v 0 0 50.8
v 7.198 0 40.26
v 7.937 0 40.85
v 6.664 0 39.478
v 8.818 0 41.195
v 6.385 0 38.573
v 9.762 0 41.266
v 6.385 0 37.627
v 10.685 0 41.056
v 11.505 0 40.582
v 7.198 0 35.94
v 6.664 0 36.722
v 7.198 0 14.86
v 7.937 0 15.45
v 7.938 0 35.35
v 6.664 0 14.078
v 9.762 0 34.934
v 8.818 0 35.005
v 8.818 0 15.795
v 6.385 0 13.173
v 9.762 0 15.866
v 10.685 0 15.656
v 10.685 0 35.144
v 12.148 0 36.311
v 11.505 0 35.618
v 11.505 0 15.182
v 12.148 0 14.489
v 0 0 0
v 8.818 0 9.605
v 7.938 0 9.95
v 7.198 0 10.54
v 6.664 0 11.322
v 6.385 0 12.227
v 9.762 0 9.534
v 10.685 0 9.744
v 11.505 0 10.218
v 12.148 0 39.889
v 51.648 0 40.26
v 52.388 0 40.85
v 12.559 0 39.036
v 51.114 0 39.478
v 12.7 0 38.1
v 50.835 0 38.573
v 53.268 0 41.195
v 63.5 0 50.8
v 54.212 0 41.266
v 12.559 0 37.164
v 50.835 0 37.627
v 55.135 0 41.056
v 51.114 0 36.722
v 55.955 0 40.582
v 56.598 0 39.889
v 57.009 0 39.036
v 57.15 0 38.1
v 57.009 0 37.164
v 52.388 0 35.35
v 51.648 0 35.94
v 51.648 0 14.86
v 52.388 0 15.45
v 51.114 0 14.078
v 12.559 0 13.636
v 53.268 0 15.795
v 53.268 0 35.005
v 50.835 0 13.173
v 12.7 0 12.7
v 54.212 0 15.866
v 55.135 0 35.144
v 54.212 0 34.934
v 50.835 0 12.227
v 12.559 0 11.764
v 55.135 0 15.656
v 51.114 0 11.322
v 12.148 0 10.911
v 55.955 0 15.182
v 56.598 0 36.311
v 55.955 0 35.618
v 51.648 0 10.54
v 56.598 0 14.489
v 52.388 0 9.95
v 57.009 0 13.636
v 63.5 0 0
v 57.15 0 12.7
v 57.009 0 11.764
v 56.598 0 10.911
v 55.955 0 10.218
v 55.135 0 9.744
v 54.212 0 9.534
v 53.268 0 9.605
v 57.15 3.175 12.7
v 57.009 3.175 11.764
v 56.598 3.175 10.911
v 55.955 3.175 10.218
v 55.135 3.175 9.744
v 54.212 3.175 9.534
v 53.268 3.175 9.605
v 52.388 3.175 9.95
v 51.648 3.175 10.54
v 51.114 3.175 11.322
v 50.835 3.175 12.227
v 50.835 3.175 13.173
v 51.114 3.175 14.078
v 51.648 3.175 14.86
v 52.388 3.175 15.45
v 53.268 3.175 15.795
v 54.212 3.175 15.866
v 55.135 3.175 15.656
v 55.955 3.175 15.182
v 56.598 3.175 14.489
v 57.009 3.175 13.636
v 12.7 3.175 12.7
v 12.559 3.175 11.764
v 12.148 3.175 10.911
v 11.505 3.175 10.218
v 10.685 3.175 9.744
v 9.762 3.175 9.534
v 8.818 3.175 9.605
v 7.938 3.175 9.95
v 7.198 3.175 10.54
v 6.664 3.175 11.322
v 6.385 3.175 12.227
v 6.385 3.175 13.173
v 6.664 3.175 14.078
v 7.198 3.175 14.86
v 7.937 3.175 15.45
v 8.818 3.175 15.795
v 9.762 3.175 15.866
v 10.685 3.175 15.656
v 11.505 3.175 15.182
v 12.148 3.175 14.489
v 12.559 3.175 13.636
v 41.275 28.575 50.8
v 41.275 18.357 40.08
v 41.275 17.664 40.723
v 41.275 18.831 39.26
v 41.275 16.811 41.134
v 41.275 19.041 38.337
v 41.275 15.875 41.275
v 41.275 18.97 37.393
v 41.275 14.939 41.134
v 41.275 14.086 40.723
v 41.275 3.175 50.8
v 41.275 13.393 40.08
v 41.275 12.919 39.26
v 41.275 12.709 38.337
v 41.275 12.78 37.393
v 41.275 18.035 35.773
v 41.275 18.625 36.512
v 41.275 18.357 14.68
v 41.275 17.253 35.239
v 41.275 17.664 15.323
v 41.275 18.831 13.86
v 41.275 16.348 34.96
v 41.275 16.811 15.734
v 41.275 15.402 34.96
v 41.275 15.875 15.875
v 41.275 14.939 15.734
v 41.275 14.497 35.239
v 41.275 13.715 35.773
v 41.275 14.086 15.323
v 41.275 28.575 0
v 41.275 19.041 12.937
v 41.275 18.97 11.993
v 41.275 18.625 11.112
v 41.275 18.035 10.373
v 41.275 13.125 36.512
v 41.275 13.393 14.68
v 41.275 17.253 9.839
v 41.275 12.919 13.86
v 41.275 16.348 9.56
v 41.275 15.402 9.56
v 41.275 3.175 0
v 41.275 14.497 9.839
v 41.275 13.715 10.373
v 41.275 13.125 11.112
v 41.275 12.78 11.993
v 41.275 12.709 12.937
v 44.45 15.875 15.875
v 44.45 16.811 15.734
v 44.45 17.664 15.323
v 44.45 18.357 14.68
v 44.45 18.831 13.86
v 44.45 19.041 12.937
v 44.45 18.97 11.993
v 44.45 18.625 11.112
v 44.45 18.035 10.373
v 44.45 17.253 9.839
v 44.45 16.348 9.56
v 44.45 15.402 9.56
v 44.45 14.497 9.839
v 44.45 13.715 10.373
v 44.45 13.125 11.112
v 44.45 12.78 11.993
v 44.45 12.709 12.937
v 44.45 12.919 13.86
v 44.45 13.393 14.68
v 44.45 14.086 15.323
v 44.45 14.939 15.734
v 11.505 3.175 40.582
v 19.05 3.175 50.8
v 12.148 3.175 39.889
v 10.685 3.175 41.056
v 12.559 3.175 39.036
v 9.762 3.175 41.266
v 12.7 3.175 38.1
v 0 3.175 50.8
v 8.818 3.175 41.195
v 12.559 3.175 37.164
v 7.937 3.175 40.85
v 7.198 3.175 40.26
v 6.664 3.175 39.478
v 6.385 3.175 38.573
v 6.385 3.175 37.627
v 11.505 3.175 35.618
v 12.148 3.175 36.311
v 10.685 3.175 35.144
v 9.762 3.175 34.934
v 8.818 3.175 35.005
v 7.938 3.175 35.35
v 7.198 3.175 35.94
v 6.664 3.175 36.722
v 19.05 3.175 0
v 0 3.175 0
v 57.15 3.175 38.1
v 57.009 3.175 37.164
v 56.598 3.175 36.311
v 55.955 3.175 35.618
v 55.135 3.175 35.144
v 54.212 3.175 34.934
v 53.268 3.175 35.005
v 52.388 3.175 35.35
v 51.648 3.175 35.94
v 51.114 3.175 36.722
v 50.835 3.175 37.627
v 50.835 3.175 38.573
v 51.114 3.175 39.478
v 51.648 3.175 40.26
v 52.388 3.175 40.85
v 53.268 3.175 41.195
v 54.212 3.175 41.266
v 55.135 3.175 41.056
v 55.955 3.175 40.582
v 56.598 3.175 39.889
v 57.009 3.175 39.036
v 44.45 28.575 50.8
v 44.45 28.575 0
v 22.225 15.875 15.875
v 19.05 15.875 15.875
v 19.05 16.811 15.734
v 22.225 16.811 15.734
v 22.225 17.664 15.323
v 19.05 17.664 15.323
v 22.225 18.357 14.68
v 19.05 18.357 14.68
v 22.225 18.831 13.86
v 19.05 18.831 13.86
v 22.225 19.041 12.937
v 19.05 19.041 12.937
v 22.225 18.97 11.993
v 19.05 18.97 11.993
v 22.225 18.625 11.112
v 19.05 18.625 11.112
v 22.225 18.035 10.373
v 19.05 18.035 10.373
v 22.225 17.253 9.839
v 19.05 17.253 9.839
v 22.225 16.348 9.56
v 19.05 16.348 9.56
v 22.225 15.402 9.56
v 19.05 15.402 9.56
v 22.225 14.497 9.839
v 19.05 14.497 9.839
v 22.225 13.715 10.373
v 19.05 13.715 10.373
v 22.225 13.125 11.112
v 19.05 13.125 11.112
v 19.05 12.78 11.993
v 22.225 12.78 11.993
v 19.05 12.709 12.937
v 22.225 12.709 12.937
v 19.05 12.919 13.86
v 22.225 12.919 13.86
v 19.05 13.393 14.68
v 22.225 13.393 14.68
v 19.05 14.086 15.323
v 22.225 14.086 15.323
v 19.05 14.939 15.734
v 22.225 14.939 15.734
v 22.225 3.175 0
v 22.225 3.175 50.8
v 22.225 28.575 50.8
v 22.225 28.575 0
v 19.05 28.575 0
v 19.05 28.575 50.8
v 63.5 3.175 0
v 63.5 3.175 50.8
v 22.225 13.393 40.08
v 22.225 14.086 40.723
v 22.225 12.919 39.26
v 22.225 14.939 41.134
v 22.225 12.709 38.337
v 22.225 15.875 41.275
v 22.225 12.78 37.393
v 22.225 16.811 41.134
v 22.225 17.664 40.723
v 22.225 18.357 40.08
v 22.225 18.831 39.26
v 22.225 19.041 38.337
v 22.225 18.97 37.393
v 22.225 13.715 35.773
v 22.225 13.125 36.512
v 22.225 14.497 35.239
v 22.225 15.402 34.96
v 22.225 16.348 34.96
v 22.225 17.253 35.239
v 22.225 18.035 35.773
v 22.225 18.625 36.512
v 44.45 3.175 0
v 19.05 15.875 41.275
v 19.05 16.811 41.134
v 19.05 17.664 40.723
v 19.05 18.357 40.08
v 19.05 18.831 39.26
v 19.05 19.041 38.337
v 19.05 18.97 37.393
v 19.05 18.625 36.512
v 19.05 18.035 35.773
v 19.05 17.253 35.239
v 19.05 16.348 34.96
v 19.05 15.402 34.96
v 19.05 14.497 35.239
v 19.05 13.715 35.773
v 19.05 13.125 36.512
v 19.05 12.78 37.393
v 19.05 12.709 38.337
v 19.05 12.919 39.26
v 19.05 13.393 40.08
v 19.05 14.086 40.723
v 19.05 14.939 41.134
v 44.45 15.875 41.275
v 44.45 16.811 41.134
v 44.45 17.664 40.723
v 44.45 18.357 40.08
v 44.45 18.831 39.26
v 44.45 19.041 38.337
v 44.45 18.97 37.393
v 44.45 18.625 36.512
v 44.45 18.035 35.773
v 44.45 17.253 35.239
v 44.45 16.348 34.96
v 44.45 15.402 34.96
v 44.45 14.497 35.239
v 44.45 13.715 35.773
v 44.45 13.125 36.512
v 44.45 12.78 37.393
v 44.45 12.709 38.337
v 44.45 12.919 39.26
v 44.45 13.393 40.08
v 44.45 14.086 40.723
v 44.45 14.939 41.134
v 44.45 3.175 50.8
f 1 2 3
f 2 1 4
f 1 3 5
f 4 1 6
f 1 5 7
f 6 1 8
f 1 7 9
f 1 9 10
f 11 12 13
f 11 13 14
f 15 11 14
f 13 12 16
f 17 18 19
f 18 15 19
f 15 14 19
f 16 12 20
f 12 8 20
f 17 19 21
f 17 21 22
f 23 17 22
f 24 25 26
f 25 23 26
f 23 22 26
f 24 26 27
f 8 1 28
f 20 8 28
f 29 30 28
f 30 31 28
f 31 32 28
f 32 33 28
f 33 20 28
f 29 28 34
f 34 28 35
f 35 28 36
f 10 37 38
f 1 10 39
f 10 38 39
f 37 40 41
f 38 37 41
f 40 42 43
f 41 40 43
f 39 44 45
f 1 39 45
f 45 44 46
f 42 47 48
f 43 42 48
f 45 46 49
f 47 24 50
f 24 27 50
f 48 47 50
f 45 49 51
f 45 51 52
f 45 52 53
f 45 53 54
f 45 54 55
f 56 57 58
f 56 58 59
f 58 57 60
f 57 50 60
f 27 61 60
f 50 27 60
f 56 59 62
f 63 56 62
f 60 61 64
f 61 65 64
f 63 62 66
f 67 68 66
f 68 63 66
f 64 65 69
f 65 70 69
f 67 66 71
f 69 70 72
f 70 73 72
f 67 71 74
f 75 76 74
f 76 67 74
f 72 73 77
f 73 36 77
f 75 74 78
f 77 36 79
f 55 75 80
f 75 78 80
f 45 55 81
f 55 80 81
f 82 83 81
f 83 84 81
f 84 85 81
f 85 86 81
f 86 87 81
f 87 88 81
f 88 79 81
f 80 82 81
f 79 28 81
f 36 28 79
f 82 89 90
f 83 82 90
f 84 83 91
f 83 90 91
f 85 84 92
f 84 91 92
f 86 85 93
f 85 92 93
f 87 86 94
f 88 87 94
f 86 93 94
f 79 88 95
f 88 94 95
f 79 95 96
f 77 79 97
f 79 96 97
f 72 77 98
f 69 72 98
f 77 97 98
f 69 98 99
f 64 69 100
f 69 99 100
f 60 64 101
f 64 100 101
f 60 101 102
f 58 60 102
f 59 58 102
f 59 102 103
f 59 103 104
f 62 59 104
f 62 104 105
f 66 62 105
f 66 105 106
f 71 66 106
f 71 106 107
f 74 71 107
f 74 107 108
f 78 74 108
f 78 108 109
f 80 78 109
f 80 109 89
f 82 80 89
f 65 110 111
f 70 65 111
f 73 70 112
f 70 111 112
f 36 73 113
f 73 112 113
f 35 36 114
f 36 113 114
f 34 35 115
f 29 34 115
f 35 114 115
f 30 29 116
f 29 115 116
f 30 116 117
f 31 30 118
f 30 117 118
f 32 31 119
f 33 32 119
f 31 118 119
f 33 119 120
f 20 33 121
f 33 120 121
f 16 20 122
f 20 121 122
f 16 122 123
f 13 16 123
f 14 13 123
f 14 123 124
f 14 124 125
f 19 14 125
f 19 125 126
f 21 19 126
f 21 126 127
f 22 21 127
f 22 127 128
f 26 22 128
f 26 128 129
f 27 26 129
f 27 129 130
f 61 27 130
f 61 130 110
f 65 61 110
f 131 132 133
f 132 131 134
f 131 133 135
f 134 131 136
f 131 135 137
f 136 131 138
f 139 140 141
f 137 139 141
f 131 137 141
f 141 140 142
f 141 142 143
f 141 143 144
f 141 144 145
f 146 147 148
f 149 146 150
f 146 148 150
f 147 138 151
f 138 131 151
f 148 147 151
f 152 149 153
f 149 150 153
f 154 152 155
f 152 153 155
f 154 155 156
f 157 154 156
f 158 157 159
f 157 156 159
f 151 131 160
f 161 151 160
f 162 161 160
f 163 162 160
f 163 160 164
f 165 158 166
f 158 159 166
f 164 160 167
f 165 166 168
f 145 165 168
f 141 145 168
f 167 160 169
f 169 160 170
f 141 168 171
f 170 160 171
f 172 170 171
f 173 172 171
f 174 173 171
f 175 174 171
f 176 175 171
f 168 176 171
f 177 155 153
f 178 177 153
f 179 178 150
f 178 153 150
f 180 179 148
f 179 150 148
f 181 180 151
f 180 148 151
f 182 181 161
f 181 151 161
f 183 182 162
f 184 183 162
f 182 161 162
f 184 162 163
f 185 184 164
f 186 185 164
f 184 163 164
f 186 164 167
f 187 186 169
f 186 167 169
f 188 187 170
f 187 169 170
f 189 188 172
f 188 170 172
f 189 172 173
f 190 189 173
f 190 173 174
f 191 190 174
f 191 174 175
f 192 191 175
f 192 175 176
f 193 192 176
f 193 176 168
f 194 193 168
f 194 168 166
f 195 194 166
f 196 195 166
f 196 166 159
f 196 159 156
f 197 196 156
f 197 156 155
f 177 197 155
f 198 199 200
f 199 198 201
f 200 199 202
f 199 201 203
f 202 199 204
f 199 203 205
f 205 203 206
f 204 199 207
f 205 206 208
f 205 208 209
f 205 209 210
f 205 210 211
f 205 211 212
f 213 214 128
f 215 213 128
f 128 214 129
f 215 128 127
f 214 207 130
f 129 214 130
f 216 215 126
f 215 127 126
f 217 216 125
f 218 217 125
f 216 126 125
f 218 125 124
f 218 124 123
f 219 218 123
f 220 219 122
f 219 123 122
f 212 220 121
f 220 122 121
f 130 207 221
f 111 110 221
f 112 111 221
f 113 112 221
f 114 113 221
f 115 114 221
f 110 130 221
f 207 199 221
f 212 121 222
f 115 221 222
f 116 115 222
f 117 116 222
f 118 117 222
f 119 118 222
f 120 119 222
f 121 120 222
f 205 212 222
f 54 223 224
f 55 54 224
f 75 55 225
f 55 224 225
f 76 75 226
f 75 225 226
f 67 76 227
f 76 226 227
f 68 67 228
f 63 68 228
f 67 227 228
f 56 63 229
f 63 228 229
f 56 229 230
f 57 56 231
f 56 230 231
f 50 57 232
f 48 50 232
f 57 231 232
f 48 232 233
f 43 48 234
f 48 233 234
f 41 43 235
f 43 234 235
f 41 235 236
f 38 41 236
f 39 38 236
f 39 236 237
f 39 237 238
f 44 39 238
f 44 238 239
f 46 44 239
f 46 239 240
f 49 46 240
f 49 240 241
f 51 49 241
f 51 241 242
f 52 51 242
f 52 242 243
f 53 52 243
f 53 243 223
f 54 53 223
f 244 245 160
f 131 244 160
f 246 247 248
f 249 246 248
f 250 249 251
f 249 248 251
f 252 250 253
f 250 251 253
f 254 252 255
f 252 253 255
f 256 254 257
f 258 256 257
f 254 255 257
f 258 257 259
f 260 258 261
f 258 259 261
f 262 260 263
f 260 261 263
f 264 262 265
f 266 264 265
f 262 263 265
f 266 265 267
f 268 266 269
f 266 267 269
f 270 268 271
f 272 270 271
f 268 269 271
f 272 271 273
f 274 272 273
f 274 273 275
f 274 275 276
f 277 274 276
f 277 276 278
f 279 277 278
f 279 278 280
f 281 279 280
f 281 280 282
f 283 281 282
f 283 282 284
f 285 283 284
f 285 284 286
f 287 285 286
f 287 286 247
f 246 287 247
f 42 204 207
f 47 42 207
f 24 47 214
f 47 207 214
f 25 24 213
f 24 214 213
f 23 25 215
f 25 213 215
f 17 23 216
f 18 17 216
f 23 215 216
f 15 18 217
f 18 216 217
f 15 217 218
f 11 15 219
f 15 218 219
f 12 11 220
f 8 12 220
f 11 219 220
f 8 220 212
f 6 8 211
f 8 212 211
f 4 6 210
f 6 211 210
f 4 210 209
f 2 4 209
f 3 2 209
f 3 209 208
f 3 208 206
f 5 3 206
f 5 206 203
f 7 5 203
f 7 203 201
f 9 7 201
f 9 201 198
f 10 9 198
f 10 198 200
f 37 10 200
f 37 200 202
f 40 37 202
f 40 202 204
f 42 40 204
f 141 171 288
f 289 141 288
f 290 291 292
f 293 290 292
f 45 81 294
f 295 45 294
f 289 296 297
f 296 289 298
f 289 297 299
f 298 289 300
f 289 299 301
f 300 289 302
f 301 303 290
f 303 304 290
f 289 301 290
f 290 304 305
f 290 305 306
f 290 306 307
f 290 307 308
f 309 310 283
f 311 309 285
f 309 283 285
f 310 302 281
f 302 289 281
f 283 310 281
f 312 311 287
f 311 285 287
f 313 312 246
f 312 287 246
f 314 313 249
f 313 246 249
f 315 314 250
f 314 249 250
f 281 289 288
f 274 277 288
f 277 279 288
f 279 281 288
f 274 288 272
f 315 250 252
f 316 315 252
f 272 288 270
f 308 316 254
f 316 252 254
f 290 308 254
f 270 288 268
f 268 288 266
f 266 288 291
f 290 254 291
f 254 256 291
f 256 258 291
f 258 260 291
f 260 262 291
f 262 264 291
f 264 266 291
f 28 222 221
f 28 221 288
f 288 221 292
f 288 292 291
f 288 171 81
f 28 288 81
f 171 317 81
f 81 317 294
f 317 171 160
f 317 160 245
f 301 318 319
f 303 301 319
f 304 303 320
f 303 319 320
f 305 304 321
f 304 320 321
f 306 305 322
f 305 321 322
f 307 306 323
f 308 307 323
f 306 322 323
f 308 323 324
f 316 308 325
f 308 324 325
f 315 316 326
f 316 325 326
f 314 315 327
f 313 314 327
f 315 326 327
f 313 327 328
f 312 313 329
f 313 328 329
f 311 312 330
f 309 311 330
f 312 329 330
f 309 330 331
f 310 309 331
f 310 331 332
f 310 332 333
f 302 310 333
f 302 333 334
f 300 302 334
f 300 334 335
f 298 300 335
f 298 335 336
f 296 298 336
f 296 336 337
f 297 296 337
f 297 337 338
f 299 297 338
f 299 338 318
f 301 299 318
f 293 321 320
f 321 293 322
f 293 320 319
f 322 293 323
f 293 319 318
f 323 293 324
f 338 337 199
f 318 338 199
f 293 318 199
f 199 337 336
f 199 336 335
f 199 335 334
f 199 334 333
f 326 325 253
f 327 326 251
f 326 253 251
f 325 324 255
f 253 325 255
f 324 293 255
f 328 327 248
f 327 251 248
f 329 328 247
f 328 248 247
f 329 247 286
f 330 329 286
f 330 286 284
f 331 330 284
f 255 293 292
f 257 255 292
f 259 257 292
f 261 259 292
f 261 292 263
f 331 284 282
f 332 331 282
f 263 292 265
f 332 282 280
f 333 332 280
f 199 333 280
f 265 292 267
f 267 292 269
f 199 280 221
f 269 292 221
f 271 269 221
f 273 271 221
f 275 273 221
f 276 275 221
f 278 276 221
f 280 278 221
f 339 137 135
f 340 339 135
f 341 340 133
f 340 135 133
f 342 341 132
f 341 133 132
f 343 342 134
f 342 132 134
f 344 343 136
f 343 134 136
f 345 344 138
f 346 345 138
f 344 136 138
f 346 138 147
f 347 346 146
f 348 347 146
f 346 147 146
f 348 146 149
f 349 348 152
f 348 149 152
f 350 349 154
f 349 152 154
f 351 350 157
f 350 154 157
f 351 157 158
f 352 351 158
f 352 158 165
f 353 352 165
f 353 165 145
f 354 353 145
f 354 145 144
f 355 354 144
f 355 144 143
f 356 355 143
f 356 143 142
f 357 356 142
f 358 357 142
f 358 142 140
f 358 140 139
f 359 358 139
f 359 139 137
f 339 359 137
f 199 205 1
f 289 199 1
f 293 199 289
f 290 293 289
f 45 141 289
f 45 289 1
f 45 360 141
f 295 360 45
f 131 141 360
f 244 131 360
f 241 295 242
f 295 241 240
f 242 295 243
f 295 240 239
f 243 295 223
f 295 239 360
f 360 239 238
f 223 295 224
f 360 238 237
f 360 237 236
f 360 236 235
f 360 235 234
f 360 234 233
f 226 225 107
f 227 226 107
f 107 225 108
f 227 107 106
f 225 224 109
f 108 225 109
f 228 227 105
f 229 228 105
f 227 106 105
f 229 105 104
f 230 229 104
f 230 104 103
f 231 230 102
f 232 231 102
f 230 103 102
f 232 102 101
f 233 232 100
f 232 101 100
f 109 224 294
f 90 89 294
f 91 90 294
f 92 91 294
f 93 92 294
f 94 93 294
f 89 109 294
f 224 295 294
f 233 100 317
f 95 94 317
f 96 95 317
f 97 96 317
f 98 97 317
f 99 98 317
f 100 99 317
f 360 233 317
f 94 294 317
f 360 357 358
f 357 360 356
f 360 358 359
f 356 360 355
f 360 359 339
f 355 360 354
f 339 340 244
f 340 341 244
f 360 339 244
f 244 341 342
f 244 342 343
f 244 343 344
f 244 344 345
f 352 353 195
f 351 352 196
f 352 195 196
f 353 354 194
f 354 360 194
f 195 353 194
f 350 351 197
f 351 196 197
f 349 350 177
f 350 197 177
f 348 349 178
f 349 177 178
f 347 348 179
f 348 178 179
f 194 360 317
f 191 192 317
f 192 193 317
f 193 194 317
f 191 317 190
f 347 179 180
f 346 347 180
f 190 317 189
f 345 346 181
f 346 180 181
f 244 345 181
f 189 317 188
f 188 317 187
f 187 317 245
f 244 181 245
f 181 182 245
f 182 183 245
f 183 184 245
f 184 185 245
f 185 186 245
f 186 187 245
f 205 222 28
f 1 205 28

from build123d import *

# Parameters (mm, degrees)
BOSS_EXTRUDE2_DEPTH = 50.8
SKETCH4_R           = 3.175
CUT_EXTRUDE1_DEPTH  = 45.45
SKETCH5_R           = 3.175
CUT_EXTRUDE2_DEPTH  = 4.175


with BuildPart() as part:
    # Sketch3 → Boss-Extrude2 (new body)
    with BuildSketch(Plane.XY):
        Polygon((0, 0), (63.5, 0), (63.5, 3.175), (44.45, 3.175), (44.45, 28.575), (41.275, 28.575), (41.275, 3.175), (22.225, 3.175), (22.225, 28.575), (19.05, 28.575), (19.05, 3.175), (0, 3.175), align=None)
    extrude(amount=BOSS_EXTRUDE2_DEPTH)

    # Sketch4 → Cut-Extrude1 (cut, through all)
    with BuildSketch(Plane.ZY.offset(-19.05)):
        with Locations((12.7, 15.875)):
            Circle(SKETCH4_R)
        with Locations((38.1, 15.875)):
            Circle(SKETCH4_R)
    extrude(amount=-CUT_EXTRUDE1_DEPTH, mode=Mode.SUBTRACT)

    # Sketch5 → Cut-Extrude2 (cut, through all)
    with BuildSketch(Plane(origin=(0, 3.175, 0), x_dir=(1, 0, 0), z_dir=(0, 1, 0))):
        with Locations((9.525, -38.1)):
            Circle(SKETCH5_R)
        with Locations((9.525, -12.7)):
            Circle(SKETCH5_R)
        with Locations((53.975, -12.7)):
            Circle(SKETCH5_R)
        with Locations((53.975, -38.1)):
            Circle(SKETCH5_R)
    extrude(amount=-CUT_EXTRUDE2_DEPTH, mode=Mode.SUBTRACT)


solid = part.part
